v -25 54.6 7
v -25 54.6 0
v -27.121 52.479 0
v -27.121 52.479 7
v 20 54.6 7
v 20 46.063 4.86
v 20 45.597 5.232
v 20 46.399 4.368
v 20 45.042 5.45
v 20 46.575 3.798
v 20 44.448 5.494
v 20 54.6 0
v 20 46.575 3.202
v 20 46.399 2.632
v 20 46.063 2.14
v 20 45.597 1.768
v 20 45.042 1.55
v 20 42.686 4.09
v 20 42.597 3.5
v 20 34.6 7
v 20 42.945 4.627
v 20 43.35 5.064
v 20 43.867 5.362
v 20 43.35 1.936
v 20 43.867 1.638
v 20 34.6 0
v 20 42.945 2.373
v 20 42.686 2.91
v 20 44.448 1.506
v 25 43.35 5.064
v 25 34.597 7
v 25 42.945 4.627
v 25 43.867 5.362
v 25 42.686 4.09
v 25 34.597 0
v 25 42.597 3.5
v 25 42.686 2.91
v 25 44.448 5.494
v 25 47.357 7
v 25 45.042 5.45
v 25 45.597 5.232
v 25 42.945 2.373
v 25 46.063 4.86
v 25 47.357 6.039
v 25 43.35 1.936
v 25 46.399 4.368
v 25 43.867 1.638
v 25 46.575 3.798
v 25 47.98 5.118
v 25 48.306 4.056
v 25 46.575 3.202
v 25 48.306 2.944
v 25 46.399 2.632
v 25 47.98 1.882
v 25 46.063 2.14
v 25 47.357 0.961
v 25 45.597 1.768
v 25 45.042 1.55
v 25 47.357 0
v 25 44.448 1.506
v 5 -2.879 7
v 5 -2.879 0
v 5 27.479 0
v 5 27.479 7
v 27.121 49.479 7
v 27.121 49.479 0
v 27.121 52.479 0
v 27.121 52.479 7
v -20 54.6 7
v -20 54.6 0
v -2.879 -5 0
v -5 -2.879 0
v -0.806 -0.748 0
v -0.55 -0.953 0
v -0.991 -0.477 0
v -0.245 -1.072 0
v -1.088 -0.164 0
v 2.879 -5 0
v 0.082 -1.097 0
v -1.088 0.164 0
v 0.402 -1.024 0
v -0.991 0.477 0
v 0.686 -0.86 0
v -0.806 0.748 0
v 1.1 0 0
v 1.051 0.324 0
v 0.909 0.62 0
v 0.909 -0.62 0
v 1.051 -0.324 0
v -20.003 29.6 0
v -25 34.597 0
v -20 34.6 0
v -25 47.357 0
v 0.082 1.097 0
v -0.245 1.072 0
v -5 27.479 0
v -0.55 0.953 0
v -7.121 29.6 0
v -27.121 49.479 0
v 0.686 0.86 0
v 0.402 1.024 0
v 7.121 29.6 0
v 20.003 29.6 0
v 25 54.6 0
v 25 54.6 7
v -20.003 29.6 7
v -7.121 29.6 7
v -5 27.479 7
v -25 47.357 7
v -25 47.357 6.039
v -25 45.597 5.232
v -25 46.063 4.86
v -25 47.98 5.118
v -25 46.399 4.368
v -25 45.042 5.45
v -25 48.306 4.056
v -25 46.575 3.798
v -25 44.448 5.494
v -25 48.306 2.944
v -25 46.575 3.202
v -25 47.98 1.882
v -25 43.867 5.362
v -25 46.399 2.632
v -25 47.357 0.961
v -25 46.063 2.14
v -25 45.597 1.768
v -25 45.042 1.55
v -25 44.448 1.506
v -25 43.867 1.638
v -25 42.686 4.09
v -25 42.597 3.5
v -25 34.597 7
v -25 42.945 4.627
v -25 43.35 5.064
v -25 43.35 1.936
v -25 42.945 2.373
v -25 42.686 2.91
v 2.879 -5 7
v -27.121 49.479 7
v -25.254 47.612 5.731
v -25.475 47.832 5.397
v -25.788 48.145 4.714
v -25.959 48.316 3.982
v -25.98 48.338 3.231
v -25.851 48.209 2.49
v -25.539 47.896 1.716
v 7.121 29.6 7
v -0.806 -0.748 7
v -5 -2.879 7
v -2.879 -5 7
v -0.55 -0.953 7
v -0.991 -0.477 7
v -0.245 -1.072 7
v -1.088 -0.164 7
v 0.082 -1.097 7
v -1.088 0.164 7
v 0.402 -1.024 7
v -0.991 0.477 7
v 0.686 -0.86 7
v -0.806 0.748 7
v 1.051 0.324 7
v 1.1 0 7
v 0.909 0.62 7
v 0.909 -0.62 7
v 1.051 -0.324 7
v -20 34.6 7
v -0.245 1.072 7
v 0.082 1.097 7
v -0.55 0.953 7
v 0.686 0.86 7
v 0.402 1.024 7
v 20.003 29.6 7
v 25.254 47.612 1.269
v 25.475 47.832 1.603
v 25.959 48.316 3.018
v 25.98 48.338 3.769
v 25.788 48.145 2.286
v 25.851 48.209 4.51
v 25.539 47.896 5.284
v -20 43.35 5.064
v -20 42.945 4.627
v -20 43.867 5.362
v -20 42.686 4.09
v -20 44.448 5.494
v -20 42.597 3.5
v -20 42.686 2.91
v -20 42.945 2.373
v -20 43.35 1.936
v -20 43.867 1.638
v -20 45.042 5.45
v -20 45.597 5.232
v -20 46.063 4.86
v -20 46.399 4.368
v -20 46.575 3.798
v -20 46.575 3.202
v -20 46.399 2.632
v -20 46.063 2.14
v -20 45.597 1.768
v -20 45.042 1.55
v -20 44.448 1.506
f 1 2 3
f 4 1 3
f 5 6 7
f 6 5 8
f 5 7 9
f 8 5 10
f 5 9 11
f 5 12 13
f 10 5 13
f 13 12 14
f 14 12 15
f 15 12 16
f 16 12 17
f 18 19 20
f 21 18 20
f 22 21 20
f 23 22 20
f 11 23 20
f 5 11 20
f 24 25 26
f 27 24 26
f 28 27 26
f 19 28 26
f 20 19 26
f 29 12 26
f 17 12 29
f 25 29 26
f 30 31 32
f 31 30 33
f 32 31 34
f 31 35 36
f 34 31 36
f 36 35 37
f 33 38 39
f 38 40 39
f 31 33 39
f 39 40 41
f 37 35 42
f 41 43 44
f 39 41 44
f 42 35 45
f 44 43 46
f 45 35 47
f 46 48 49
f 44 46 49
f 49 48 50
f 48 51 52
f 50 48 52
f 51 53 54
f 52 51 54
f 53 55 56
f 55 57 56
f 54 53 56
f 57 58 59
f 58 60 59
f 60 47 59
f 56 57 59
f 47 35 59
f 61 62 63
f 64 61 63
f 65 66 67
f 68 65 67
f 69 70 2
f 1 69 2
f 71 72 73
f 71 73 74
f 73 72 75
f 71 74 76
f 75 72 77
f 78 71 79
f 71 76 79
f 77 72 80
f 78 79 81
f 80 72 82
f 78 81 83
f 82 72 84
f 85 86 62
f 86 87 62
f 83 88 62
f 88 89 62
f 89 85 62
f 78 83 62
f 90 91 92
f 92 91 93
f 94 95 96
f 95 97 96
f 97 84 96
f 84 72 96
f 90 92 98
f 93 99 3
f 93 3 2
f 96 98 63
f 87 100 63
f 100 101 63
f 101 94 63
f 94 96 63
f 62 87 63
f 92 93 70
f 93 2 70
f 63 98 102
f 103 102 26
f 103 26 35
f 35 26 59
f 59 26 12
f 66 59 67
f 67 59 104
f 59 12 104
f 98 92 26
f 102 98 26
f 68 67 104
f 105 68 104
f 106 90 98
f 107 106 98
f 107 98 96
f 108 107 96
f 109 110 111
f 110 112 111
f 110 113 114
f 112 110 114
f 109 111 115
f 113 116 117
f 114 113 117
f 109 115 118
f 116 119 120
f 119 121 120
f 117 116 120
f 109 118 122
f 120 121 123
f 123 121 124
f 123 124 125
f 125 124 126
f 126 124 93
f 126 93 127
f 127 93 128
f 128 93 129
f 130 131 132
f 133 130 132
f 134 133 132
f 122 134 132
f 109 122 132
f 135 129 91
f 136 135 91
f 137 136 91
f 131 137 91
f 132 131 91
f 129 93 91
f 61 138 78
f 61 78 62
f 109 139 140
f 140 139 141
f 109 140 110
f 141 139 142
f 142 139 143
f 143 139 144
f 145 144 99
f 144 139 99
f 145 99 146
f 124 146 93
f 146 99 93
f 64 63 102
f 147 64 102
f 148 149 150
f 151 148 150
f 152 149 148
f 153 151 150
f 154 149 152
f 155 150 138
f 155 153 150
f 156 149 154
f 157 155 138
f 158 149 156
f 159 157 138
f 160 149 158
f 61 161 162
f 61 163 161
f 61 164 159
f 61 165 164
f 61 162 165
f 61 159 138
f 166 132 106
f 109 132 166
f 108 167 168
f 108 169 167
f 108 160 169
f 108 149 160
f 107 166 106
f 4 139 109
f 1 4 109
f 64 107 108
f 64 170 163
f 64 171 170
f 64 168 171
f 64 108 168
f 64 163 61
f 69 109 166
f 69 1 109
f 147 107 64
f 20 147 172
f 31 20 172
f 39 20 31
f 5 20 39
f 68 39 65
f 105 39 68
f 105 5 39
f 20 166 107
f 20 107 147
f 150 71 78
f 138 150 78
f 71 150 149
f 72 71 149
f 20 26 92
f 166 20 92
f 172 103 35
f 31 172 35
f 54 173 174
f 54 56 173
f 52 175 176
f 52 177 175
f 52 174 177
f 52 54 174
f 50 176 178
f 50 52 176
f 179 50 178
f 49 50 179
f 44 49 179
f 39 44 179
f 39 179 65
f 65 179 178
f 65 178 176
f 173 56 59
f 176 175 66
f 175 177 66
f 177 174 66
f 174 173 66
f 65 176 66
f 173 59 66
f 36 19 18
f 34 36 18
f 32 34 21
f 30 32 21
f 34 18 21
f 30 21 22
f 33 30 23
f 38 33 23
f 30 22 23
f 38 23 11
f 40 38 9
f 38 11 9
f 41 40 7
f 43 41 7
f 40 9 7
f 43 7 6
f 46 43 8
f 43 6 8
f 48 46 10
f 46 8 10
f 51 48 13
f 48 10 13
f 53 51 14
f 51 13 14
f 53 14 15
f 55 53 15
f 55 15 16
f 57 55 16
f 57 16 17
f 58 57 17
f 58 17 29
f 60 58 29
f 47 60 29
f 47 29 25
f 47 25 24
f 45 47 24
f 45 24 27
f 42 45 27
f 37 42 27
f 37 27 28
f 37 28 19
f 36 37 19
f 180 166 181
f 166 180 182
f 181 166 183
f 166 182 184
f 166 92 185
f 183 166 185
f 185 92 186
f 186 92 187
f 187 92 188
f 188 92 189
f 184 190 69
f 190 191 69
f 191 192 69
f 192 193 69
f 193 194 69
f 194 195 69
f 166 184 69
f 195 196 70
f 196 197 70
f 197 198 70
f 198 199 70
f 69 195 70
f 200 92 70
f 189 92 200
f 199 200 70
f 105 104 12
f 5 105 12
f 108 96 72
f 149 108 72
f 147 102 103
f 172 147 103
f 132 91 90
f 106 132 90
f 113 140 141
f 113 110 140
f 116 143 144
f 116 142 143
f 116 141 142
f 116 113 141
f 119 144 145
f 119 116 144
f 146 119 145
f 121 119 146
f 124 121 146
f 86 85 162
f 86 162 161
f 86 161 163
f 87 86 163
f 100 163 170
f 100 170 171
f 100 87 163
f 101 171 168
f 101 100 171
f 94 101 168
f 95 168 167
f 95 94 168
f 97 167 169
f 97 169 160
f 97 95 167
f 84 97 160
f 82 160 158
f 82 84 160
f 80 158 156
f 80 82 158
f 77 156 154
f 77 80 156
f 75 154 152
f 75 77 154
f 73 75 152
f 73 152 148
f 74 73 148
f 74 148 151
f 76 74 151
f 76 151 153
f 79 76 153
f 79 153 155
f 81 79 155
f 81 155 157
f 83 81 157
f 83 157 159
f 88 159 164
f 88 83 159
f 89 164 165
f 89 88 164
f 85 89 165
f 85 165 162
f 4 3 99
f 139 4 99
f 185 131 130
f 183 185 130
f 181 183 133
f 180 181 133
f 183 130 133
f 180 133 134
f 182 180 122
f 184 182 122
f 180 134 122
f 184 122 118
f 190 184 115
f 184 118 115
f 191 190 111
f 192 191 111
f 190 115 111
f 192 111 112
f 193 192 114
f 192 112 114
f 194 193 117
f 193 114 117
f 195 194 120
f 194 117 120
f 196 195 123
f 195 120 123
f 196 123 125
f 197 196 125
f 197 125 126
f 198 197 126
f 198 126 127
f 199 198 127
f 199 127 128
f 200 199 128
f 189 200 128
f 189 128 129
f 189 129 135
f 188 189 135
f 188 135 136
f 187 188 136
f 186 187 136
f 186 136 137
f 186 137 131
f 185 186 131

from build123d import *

# Parameters (mm, degrees)
CROQUIS1_R              = 1.1
SALIENTE_EXTRUIR1_DEPTH = 7
CORTAR_EXTRUIR1_DEPTH   = 62.365511626
CROQUIS3_R              = 2
CORTAR_EXTRUIR3_DEPTH   = 76.80759879
CROQUIS4_R              = 3.75
CORTAR_EXTRUIR4_DEPTH   = 76.80759879
CROQUIS5_R              = 3.75
CORTAR_EXTRUIR5_DEPTH   = 76.80759879


with BuildPart() as part:
    # Croquis1 → Saliente-Extruir1 (new body)
    with BuildSketch(Plane.XY):
        Polygon((-5, 27.478679656), (-5, -5), (5, -5), (5, 27.478679656), (7.121320344, 29.6), (20.002640687, 29.6), (25, 34.597359313), (25, 47.357359313), (27.121320344, 49.478679656), (27.121320344, 52.478679656), (25, 54.6), (20, 54.6), (20, 34.6), (-20, 34.6), (-20, 54.6), (-25, 54.6), (-27.121320344, 52.478679656), (-27.121320344, 49.478679656), (-25, 47.357359313), (-25, 34.597359313), (-20.002640687, 29.6), (-7.121320344, 29.6), align=None)
        Circle(CROQUIS1_R, mode=Mode.SUBTRACT)
    extrude(amount=SALIENTE_EXTRUIR1_DEPTH)

    # Croquis2 → Cortar-Extruir1 (cut, through all)
    with BuildSketch(Plane(origin=(0, 0, 0), x_dir=(-1, 0, 0), z_dir=(0, 0, -1))):
        Polygon((-5, -5), (-2.878679656, -5), (-5, -2.878679656), align=None)
        Polygon((2.878679656, -5), (5, -2.878679656), (5, -5), align=None)
    extrude(amount=-CORTAR_EXTRUIR1_DEPTH, mode=Mode.SUBTRACT)

    # Croquis3 → Cortar-Extruir3 (cut, through all)
    with BuildSketch(Plane.ZY.offset(25)):
        with Locations(Location((3.5, 44.597359313, 0), (0, 0, 270))):
            Circle(CROQUIS3_R)
    extrude(amount=-CORTAR_EXTRUIR3_DEPTH, mode=Mode.SUBTRACT)

    # Croquis4 → Cortar-Extruir4 (cut, through all)
    with BuildSketch(Plane.ZY.offset(25)):
        with Locations((3.5, 44.597359313)):
            Circle(CROQUIS4_R)
    extrude(amount=CORTAR_EXTRUIR4_DEPTH, mode=Mode.SUBTRACT)

    # Croquis5 → Cortar-Extruir5 (cut, through all)
    with BuildSketch(Plane(origin=(25, 0, 0), x_dir=(0, 0, -1), z_dir=(1, 0, 0))):
        with Locations((-3.5, 44.597359313)):
            Circle(CROQUIS5_R)
    extrude(amount=CORTAR_EXTRUIR5_DEPTH, mode=Mode.SUBTRACT)


solid = part.part
